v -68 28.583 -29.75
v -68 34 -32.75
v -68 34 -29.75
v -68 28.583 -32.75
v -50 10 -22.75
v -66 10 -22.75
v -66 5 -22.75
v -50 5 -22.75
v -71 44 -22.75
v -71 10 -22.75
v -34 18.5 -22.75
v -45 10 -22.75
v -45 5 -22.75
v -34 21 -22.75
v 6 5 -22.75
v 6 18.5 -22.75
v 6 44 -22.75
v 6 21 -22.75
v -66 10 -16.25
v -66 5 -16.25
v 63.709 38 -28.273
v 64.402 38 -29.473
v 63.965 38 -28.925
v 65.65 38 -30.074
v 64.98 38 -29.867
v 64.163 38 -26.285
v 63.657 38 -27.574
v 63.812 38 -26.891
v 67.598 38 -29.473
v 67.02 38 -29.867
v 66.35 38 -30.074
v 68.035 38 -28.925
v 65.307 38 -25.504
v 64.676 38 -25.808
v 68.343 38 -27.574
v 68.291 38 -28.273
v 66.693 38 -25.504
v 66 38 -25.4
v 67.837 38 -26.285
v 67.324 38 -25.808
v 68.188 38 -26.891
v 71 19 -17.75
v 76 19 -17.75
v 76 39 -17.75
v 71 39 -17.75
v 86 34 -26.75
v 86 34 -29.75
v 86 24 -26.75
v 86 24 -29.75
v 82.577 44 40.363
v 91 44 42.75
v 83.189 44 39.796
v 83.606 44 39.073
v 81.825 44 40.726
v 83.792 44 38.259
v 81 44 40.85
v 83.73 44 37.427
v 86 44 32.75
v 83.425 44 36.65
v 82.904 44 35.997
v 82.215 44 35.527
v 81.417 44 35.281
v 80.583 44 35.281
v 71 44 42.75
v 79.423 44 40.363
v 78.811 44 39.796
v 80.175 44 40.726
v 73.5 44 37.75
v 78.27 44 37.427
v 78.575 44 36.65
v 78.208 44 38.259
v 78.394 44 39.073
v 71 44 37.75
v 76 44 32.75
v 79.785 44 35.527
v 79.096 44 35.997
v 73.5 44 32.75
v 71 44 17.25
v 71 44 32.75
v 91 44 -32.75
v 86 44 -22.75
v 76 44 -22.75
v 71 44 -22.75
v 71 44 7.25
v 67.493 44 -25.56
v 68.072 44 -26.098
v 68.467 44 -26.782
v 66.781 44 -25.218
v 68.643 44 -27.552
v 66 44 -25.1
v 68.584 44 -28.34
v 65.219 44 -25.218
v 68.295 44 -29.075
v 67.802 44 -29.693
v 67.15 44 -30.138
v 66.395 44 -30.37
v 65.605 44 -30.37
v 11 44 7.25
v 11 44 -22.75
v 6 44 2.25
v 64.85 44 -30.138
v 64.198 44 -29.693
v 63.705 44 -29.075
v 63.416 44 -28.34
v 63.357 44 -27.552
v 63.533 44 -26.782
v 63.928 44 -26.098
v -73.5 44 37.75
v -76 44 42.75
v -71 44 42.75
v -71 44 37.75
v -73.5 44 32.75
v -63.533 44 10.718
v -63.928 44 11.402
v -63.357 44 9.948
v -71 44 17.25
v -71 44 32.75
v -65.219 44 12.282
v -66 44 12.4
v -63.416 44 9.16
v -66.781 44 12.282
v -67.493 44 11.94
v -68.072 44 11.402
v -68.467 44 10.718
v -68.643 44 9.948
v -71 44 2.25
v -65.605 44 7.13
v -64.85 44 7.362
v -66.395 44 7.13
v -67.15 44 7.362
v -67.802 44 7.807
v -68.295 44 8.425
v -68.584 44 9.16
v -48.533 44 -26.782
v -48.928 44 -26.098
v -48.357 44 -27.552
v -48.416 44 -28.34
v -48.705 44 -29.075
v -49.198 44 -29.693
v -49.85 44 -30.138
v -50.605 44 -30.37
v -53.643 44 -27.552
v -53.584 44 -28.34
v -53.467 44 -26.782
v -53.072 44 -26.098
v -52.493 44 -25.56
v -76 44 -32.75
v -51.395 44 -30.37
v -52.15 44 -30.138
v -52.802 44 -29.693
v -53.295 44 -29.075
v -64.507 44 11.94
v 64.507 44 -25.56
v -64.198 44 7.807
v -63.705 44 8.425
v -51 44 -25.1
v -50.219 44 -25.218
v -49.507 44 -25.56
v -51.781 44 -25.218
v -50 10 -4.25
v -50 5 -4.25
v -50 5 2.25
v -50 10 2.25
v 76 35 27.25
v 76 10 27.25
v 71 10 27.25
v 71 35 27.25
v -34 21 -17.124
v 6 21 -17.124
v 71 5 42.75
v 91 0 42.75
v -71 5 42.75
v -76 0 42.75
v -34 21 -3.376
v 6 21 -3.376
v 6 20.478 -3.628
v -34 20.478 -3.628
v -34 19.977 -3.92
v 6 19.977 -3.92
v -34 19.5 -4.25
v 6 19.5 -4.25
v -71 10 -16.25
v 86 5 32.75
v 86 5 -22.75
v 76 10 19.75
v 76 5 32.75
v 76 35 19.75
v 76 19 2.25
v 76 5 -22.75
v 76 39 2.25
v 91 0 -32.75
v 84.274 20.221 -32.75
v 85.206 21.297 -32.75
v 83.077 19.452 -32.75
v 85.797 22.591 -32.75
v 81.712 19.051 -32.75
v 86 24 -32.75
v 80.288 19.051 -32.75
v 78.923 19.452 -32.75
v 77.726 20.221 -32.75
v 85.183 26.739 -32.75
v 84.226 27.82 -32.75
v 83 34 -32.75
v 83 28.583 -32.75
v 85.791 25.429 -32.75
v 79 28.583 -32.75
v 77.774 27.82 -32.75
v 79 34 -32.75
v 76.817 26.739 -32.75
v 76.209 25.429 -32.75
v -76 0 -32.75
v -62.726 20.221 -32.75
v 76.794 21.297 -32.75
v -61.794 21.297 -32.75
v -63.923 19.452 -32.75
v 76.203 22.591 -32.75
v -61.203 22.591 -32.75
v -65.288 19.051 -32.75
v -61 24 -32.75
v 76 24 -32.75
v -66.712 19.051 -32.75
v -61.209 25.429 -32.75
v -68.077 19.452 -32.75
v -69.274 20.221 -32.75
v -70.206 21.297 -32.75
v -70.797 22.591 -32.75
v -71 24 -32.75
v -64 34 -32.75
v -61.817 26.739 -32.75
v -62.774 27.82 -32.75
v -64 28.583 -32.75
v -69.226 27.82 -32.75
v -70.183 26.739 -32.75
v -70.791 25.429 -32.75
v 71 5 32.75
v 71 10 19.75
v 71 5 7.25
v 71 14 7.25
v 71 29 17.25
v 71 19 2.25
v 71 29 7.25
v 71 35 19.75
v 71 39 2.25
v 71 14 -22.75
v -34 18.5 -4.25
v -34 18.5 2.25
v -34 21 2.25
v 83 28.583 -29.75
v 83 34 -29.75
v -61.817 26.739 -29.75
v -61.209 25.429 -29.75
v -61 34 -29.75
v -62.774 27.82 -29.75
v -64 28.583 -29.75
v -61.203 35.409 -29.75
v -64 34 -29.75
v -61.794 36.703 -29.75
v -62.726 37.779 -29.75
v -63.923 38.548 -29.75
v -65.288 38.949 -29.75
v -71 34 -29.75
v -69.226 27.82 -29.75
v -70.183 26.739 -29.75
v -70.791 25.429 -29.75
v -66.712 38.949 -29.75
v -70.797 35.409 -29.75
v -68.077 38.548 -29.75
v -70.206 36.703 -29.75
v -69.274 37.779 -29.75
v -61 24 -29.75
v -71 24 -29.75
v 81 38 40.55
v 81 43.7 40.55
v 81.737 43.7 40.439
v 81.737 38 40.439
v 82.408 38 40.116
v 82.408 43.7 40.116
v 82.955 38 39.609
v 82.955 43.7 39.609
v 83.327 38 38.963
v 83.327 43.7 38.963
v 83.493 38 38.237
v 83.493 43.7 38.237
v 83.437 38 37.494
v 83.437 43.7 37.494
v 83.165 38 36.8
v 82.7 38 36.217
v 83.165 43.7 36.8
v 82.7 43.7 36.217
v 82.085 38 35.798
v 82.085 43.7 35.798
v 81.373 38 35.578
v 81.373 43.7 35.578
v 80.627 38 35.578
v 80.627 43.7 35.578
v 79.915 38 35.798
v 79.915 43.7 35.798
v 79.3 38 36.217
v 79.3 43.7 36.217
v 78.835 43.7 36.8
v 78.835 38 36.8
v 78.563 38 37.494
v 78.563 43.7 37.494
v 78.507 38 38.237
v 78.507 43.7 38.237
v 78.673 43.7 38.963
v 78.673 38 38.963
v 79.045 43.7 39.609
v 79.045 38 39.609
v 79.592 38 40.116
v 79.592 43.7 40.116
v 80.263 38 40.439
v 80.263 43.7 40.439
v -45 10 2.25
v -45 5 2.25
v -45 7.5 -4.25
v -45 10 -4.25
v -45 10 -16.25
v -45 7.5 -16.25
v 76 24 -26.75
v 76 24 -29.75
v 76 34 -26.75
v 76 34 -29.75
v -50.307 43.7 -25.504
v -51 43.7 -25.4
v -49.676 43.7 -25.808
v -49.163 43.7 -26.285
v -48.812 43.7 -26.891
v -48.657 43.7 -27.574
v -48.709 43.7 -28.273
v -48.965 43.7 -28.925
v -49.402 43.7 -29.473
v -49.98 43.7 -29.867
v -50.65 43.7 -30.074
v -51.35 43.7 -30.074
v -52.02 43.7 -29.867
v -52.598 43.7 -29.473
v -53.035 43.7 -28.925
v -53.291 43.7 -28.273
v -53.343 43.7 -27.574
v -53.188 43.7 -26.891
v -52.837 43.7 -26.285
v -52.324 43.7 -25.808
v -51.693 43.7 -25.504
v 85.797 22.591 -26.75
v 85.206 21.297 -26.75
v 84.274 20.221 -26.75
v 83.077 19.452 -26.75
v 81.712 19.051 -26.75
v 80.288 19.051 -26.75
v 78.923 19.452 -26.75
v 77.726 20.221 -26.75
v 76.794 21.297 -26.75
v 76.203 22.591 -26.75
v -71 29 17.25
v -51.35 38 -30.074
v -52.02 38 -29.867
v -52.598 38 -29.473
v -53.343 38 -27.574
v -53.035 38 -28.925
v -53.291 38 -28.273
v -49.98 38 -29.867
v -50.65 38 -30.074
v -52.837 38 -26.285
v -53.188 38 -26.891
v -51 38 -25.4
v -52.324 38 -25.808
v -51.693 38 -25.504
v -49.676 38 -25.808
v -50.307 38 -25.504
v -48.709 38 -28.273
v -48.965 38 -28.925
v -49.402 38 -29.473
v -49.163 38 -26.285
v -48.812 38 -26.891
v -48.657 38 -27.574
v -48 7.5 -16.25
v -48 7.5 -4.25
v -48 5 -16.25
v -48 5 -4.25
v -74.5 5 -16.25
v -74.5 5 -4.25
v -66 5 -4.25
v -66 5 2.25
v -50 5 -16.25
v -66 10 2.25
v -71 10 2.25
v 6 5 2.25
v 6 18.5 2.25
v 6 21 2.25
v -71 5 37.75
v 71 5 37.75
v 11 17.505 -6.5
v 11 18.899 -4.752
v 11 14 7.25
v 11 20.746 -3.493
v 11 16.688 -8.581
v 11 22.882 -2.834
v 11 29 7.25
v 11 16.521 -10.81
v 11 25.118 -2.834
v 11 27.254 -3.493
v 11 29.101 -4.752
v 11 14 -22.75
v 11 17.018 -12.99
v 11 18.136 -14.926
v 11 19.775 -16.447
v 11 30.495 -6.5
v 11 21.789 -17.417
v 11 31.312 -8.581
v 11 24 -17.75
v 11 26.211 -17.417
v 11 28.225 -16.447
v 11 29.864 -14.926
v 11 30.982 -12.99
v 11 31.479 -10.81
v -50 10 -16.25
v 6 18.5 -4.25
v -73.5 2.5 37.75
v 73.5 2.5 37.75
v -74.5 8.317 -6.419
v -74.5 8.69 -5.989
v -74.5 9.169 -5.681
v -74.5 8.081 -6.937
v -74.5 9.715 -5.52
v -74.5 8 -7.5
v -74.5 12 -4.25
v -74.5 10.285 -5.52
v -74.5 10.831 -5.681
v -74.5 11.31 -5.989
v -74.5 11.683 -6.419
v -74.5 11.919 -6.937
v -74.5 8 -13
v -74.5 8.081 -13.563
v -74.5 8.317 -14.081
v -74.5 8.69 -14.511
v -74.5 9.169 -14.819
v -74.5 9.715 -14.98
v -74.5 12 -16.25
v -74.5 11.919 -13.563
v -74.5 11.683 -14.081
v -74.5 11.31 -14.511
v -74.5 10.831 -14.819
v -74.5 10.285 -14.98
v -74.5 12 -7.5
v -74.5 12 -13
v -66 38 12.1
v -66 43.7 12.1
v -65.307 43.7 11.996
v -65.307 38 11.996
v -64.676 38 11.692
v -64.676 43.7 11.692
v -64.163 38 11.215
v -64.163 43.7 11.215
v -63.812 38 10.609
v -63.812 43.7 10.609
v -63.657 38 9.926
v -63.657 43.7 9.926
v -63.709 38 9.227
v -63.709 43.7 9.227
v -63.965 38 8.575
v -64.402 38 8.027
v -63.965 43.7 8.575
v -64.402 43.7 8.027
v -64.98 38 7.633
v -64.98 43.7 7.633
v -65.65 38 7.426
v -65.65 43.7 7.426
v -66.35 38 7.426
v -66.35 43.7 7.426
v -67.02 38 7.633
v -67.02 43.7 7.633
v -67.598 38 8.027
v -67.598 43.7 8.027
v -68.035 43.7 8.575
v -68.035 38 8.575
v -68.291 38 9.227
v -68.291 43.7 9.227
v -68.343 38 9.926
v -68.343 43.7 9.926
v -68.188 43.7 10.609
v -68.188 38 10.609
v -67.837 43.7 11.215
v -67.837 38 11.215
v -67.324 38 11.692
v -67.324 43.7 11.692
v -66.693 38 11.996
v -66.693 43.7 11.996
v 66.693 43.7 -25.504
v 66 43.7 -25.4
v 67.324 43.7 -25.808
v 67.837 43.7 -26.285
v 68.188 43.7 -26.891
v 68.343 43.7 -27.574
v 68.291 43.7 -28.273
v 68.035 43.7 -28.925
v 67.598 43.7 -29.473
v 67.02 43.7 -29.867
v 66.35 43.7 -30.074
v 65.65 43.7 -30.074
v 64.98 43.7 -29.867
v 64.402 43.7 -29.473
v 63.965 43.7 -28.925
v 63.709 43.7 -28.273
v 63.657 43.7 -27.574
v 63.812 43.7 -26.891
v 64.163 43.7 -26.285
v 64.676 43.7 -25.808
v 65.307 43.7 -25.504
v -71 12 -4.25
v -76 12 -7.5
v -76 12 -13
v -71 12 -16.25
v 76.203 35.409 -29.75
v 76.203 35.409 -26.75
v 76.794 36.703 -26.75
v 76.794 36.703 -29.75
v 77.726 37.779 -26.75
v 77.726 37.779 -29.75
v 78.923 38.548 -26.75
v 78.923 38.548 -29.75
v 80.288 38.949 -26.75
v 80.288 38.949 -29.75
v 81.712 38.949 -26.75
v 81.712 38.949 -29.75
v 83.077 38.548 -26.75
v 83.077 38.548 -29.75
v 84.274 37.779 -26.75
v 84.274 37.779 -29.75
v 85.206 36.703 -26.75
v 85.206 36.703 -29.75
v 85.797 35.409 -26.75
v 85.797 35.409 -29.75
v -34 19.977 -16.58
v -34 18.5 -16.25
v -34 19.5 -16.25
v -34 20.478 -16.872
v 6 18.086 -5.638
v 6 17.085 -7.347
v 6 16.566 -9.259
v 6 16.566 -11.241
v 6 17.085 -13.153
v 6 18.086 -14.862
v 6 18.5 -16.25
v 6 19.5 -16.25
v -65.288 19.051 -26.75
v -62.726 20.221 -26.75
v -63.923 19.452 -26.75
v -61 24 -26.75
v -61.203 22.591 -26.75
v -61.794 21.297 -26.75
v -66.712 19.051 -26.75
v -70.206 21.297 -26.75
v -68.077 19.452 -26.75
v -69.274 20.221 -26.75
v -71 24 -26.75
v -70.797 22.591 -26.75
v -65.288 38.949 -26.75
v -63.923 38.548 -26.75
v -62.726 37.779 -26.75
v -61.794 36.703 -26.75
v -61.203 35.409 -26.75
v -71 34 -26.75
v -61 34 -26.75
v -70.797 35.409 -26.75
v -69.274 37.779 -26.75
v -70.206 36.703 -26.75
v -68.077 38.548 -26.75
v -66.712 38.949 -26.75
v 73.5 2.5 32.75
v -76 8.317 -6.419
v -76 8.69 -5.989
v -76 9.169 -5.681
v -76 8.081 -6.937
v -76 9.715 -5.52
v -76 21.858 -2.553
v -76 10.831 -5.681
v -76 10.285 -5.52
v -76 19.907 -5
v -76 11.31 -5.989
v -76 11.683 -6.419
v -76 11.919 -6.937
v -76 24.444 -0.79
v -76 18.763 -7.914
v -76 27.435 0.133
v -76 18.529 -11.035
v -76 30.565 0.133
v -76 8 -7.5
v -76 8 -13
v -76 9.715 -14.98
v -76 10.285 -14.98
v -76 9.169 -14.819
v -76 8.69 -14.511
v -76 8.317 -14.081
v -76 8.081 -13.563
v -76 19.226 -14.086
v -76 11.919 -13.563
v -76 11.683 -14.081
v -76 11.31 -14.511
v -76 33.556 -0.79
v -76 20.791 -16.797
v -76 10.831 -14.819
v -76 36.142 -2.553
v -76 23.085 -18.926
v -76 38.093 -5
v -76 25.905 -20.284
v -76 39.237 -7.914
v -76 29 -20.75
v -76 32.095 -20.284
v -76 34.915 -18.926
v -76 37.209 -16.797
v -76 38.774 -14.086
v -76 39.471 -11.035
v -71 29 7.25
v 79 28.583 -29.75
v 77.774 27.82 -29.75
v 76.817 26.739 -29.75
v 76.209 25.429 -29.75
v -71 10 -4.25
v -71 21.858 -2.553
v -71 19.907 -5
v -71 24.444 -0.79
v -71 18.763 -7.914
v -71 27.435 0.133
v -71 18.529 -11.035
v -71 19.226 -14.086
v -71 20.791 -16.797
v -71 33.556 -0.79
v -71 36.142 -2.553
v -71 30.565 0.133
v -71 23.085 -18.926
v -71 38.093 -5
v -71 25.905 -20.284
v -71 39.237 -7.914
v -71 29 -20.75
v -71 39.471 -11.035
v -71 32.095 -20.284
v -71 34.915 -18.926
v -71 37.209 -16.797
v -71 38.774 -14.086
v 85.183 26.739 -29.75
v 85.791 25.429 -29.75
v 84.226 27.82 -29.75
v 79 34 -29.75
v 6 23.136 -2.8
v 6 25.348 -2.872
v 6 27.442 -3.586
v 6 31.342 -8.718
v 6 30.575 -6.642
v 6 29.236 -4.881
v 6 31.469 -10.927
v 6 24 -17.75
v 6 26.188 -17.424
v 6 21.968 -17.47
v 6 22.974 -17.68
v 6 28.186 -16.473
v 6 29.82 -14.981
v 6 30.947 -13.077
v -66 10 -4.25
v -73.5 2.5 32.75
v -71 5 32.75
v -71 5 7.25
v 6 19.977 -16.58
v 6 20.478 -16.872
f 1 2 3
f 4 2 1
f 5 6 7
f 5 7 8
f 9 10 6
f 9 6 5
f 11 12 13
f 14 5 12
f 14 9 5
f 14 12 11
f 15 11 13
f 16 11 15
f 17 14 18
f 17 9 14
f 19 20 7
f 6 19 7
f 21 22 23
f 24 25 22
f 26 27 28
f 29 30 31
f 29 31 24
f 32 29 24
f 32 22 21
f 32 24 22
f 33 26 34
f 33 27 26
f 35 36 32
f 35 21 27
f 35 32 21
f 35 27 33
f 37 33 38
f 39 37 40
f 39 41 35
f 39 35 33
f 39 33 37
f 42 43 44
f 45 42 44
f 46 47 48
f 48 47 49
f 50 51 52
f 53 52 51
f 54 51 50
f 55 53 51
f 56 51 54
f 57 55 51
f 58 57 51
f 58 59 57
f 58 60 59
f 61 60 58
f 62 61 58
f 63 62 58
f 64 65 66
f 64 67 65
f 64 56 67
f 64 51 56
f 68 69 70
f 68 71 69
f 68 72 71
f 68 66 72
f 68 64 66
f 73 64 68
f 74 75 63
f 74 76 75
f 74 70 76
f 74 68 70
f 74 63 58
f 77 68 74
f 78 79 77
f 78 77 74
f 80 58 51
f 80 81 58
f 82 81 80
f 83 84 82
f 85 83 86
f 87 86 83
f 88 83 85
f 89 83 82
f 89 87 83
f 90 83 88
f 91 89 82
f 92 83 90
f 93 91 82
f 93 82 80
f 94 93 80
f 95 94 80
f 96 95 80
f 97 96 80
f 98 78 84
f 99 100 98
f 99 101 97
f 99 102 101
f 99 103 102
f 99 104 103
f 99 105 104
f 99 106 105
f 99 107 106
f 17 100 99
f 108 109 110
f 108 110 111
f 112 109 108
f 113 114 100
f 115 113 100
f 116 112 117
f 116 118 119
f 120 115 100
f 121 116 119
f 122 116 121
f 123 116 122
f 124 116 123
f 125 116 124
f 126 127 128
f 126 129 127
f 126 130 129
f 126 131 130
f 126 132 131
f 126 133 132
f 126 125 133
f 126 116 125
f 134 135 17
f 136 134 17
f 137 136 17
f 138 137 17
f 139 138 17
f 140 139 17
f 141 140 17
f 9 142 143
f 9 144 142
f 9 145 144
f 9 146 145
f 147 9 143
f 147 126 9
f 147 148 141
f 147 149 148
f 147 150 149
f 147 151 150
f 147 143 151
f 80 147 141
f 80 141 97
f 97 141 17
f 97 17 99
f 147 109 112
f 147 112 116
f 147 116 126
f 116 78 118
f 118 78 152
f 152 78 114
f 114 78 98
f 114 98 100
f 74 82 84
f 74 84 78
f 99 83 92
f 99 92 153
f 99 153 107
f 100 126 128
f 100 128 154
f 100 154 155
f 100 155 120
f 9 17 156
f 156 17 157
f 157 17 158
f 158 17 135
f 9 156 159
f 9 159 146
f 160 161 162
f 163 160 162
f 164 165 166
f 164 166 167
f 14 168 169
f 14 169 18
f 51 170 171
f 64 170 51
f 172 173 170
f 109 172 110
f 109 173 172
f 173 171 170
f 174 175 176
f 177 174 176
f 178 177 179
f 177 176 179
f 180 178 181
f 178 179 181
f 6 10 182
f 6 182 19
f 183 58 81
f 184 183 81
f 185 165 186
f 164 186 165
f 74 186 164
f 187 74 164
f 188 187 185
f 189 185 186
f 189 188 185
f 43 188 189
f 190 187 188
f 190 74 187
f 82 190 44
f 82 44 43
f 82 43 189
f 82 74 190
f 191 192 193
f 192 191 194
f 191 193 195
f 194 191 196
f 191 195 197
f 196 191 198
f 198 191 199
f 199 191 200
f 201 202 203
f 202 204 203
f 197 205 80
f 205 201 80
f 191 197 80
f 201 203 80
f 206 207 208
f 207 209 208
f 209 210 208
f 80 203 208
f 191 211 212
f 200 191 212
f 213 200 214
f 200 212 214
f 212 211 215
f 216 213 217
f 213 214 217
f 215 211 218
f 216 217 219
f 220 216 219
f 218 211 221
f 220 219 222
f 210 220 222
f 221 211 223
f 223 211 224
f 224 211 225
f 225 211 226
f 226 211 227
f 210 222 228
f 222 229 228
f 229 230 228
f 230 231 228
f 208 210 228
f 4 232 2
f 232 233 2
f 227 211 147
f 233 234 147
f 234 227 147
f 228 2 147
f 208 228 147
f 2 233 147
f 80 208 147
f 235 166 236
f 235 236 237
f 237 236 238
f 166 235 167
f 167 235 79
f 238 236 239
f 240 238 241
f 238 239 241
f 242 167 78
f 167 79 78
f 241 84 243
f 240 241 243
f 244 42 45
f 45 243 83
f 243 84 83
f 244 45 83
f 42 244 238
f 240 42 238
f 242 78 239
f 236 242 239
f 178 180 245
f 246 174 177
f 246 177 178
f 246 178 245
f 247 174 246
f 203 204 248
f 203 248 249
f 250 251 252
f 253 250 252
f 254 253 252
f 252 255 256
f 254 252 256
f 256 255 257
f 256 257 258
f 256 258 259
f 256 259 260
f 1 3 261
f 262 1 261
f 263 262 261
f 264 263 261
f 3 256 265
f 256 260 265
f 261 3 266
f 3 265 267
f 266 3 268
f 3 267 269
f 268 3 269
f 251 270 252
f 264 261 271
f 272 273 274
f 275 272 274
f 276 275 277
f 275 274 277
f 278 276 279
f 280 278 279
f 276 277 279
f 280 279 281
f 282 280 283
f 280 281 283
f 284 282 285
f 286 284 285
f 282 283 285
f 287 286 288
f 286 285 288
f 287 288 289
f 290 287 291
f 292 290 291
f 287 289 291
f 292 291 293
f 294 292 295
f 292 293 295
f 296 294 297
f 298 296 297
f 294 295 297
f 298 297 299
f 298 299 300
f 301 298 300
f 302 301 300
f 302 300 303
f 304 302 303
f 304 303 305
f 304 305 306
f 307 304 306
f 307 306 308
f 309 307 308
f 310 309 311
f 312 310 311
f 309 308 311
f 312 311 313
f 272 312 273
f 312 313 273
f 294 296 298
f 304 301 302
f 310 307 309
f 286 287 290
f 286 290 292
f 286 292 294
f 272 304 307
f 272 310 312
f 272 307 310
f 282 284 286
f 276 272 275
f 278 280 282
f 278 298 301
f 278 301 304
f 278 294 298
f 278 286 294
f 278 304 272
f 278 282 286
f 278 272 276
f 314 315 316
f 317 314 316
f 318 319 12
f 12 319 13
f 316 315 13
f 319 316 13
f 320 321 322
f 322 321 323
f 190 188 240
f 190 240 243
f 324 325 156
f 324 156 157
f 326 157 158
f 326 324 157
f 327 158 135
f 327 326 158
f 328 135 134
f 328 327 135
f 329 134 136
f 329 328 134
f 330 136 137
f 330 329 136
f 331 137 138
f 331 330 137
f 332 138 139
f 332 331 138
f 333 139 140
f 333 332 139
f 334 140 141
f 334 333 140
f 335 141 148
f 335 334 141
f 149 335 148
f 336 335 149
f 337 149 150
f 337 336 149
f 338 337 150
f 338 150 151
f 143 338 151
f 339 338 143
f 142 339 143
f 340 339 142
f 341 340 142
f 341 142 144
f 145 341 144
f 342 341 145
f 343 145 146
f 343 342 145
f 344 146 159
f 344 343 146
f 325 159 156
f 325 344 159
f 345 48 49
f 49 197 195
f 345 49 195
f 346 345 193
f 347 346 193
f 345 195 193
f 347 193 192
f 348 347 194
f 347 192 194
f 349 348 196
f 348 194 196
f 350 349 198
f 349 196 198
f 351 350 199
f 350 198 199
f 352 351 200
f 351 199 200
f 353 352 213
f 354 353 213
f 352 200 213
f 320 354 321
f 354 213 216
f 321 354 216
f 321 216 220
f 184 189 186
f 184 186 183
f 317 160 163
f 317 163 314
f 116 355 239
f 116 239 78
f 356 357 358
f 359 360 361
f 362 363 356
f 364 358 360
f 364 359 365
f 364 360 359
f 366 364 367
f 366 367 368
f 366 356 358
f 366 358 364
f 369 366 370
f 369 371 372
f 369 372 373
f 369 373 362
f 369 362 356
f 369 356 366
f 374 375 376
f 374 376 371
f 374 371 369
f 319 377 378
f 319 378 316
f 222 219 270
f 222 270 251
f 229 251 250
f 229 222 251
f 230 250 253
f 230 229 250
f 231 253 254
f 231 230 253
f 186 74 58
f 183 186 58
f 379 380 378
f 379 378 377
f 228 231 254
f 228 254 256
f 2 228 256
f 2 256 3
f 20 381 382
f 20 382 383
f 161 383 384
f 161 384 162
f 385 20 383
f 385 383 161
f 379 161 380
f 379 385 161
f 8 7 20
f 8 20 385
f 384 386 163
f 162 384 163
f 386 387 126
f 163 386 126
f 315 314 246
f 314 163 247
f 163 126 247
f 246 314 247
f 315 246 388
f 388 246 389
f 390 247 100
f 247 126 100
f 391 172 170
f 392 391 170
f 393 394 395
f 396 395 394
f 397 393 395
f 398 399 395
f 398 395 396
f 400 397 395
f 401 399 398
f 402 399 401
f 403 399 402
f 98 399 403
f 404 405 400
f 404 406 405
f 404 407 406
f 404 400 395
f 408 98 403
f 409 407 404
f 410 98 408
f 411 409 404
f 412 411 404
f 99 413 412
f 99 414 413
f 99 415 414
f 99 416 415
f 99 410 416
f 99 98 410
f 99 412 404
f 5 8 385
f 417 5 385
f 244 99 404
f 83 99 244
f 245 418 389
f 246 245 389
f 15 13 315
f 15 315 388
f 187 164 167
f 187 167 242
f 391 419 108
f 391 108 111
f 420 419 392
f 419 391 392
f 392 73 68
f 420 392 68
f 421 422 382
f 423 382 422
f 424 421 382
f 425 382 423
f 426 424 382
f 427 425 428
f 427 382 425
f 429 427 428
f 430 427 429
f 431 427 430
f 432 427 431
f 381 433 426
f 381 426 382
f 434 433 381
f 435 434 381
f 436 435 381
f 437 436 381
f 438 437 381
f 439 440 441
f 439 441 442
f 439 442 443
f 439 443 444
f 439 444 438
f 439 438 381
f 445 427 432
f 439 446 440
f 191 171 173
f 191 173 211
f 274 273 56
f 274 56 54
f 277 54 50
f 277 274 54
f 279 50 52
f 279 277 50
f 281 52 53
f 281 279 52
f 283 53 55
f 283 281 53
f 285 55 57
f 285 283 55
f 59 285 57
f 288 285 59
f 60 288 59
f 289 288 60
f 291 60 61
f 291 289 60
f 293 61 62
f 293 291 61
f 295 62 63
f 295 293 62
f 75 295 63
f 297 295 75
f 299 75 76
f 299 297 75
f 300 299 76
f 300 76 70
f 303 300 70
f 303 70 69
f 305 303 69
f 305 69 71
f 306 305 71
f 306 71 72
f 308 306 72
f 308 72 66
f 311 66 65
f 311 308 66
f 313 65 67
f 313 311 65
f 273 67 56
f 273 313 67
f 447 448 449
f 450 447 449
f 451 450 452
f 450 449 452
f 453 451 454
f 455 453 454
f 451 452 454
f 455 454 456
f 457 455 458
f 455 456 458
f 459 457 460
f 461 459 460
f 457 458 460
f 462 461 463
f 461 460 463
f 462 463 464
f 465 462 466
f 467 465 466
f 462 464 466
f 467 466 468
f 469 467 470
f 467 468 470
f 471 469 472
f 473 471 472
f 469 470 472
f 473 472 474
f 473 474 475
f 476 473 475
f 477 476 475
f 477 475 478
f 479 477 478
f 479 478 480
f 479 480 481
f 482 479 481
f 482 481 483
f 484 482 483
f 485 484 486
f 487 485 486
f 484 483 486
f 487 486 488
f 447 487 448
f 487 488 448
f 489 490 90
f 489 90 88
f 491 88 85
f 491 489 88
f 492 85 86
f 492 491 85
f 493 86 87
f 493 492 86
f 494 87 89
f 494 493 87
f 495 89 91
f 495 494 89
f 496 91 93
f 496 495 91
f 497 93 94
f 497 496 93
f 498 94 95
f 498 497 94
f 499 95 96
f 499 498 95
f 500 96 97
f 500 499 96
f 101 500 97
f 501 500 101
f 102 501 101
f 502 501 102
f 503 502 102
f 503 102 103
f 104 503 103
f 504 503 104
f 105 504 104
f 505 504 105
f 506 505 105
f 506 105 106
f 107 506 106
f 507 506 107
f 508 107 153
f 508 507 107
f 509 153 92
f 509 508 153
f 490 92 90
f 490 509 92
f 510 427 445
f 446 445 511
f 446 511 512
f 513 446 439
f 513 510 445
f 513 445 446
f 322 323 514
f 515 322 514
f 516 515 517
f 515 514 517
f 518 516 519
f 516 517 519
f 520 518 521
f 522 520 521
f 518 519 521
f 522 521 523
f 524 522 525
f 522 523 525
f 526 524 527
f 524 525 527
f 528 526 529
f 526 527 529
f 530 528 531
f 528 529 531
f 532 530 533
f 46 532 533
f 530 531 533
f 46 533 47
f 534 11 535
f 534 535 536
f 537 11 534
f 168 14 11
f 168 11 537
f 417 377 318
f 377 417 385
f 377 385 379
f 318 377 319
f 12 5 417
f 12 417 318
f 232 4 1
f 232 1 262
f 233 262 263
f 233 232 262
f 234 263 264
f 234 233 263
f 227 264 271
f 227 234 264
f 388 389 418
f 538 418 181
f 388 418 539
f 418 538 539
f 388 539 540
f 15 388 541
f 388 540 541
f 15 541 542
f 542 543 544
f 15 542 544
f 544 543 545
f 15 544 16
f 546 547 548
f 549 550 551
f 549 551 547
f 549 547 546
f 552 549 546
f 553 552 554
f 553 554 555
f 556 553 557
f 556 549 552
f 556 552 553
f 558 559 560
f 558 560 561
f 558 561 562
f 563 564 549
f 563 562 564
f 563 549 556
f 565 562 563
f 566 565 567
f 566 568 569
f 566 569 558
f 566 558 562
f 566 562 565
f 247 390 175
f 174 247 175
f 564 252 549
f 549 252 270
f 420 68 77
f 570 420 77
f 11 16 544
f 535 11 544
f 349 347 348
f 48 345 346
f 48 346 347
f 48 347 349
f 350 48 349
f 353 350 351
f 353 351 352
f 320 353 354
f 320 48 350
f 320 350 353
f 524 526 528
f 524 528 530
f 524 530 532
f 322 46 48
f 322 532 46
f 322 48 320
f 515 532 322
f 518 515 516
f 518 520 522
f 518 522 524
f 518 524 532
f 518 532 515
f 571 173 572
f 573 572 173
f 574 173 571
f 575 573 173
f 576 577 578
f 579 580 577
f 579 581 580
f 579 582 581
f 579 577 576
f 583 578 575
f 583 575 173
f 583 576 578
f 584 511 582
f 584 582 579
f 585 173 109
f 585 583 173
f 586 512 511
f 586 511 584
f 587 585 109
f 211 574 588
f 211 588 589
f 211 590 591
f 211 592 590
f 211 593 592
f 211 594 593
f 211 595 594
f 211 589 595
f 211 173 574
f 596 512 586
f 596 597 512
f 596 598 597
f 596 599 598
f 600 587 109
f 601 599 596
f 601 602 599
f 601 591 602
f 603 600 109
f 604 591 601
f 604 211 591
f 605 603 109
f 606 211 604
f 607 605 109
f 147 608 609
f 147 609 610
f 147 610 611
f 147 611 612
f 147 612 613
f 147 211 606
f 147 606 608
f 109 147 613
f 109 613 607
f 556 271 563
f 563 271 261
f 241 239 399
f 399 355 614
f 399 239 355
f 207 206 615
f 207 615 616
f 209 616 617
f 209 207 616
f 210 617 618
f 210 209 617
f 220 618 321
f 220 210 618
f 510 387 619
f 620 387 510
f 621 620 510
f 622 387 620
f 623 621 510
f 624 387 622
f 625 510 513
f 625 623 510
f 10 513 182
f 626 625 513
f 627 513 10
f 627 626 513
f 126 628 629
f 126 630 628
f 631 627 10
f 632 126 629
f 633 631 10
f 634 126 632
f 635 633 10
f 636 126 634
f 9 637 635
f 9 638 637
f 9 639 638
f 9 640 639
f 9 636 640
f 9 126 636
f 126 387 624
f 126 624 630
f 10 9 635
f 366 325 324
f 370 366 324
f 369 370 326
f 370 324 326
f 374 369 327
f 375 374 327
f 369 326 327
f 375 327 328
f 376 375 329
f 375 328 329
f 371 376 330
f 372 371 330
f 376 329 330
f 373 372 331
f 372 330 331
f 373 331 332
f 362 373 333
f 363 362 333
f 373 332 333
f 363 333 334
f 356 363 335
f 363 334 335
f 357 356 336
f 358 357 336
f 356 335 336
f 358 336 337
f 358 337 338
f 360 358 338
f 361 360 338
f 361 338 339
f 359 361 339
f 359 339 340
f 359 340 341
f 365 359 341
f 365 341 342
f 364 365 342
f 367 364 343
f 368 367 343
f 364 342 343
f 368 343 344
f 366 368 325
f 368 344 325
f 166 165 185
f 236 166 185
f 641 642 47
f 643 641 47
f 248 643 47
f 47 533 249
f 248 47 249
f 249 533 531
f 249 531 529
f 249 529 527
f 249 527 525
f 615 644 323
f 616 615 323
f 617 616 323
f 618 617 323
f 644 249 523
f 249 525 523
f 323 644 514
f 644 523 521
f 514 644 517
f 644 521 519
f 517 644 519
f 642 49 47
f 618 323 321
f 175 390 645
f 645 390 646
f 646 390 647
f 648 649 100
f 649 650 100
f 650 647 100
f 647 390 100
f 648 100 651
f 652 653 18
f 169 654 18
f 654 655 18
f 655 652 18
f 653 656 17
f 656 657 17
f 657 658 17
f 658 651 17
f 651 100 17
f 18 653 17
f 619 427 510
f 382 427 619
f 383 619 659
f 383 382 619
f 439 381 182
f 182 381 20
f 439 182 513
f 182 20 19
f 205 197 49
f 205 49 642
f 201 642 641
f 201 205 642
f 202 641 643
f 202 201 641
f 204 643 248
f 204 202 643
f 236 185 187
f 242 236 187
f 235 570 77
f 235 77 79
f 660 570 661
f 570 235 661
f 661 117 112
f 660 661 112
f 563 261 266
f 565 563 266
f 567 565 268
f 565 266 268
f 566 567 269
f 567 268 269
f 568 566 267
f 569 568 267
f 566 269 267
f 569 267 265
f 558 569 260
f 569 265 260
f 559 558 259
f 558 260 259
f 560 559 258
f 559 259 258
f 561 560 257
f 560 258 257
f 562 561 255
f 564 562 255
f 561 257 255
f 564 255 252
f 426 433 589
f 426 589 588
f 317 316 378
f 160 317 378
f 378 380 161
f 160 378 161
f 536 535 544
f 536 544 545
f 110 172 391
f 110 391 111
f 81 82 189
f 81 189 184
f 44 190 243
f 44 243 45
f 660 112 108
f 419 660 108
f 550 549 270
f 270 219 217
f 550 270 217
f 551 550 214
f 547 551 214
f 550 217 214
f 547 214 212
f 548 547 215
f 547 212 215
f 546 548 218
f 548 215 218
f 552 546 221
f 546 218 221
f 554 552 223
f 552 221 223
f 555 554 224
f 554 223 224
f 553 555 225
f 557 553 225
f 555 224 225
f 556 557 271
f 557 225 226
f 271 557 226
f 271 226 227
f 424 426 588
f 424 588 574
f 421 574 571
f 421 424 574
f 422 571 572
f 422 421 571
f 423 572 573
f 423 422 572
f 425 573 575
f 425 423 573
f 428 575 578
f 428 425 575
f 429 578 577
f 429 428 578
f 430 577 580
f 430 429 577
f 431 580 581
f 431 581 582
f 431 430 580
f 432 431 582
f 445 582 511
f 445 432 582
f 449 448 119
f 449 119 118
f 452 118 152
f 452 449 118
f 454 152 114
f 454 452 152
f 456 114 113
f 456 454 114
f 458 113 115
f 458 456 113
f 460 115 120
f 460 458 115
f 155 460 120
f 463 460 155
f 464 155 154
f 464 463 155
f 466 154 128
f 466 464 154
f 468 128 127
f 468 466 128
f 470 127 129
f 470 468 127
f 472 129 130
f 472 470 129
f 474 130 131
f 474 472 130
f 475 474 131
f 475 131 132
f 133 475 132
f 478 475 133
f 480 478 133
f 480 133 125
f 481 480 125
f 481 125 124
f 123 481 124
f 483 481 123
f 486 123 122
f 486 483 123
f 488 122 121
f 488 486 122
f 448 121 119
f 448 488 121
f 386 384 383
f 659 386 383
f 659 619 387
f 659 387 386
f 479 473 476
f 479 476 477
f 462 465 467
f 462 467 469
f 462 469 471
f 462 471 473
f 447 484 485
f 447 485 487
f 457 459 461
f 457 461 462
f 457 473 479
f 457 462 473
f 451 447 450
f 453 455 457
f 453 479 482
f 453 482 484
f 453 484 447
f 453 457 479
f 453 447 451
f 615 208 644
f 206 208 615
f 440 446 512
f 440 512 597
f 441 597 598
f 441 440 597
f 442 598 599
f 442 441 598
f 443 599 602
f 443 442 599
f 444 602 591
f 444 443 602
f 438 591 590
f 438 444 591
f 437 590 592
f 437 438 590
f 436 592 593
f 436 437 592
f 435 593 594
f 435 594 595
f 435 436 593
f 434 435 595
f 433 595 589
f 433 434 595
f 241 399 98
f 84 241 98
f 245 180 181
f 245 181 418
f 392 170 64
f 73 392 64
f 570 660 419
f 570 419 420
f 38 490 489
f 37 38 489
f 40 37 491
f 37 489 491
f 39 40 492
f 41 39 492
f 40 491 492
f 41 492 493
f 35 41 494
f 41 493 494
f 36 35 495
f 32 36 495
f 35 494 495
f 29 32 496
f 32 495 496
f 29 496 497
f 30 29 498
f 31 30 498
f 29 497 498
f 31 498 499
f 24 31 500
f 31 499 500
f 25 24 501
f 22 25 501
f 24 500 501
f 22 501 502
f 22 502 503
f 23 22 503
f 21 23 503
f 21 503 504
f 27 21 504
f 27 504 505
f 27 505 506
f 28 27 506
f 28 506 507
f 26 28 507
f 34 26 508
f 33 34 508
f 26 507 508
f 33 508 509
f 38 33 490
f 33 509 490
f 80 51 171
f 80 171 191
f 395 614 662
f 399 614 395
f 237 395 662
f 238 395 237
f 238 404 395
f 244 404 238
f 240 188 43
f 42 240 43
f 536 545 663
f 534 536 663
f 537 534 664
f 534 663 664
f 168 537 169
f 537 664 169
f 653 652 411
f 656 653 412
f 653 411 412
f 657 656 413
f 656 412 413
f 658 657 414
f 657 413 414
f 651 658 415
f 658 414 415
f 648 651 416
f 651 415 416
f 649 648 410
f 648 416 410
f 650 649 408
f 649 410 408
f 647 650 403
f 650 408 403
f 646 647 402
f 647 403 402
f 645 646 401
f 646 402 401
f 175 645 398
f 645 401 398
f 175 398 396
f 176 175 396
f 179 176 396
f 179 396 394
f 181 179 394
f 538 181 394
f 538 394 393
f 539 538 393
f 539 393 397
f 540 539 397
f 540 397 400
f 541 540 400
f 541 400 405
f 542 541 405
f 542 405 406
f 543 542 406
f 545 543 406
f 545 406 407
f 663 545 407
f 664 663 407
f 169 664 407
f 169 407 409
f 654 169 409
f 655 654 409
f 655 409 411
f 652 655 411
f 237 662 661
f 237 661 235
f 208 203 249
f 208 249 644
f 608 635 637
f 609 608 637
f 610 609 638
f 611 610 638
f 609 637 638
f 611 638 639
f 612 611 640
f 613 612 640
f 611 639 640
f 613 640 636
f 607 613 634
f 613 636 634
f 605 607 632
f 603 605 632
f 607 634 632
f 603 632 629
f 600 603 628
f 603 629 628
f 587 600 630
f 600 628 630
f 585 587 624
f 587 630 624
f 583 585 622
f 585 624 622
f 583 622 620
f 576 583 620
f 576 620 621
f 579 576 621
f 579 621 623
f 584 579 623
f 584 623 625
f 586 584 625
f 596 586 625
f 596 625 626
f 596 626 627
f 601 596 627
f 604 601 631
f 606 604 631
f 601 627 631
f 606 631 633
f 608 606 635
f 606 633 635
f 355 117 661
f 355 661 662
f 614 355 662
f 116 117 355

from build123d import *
from build123d.topology import SkipClean

# Parameters (mm, degrees)
SKETCH1_W           = 152
SKETCH1_H           = 65.5
BOSS_EXTRUDE1_DEPTH = 44
SKETCH2_W           = 142
SKETCH2_H           = 25.5
CUT_EXTRUDE1_DEPTH  = 39
SKETCH4_W           = 60
SKETCH4_H           = 30
CUT_EXTRUDE2_DEPTH  = 30
BOSS_EXTRUDE3_REACH = 158.9
SKETCH5_W           = 10
SKETCH5_H           = 15
SKETCH9_W           = 152
SKETCH9_H           = 44
BOSS_EXTRUDE4_DEPTH = 10
CUT_EXTRUDE5_DEPTH  = 41.5
SKETCH11_W          = 142
SKETCH11_H          = 39
CUT_EXTRUDE6_DEPTH  = 5
SKETCH16_W          = 77
SKETCH16_H          = 25
CUT_EXTRUDE8_DEPTH  = 39
SKETCH17_R          = 10.5
CUT_EXTRUDE9_DEPTH  = 5
SKETCH18_R          = 7.5
CUT_EXTRUDE10_DEPTH = 5
SKETCH20_W          = 75.5
SKETCH20_H          = 44
BOSS_EXTRUDE6_DEPTH = 15
SKETCH21_W          = 10
SKETCH21_H          = 55.5
CUT_EXTRUDE12_DEPTH = 39
SKETCH22_W          = 20
SKETCH22_H          = 20
SKETCH22_W_2        = 7.5
SKETCH22_H_2        = 25
CUT_EXTRUDE13_DEPTH = 5
CUT_EXTRUDE14_DEPTH = 3.5
SKETCH24_W          = 5
SKETCH24_H          = 6.5
BOSS_EXTRUDE7_DEPTH = 5
SKETCH24_3_W        = 3
SKETCH24_3_H        = 12
BOSS_EXTRUDE8_DEPTH = 2.5
CUT_EXTRUDE7_DEPTH  = 6
BOSS_EXTRUDE5_DEPTH = 3
SKETCH19_R          = 2.35
SKETCH19_R_2        = 2.5
CUT_EXTRUDE11_DEPTH = 6
BOSS_EXTRUDE9_DEPTH = 40
CHAMFER1_SIZE       = 0.3


with BuildPart() as part:
    # Sketch1 → Boss-Extrude1 (new body)
    with BuildSketch(Plane(origin=(0, 0, 0), x_dir=(1, 0, 0), z_dir=(0, 1, 0))):
        Rectangle(SKETCH1_W, SKETCH1_H)
    extrude(amount=BOSS_EXTRUDE1_DEPTH)

    # Sketch2 → Cut-Extrude1 (cut)
    with BuildSketch(Plane(origin=(0, 44, 0), x_dir=(1, 0, 0), z_dir=(0, 1, 0))):
        with Locations((0, -20)):
            Rectangle(SKETCH2_W, SKETCH2_H)
    extrude(amount=-CUT_EXTRUDE1_DEPTH, mode=Mode.SUBTRACT)

    # Sketch4 → Cut-Extrude2 (cut)
    with BuildSketch(Plane(origin=(0, 44, 0), x_dir=(1, 0, 0), z_dir=(0, 1, 0))):
        with Locations((41, 7.75)):
            Rectangle(SKETCH4_W, SKETCH4_H)
    extrude(amount=-CUT_EXTRUDE2_DEPTH, mode=Mode.SUBTRACT)

    # Boss-Extrude3: up to this face of the body (flat: up to its plane)
    boss_extrude3_end = Plane(part.part.faces().sort_by_distance((71, 26.637767221, 6.817102138))[0])
    # Sketch5 → Boss-Extrude3 (add, up to the picked face)
    with BuildSketch(Plane(origin=(-71, 0, 0), x_dir=(0, 0, -1), z_dir=(1, 0, 0)), mode=Mode.PRIVATE) as boss_extrude3_sk1:
        with Locations((-12.25, 36.5)):
            Rectangle(SKETCH5_W, SKETCH5_H)
    boss_extrude3_tool1 = split(extrude(boss_extrude3_sk1.sketch, amount=BOSS_EXTRUDE3_REACH, mode=Mode.PRIVATE), bisect_by=boss_extrude3_end, keep=Keep.BOTH, mode=Mode.PRIVATE)
    add(boss_extrude3_tool1.solids().sort_by(Axis((-71, 36.5, 12.25), (1, 0, 0)))[0])

    # Sketch9 → Boss-Extrude4 (add)
    with BuildSketch(Plane.XY.offset(32.75)):
        with Locations((0, 22)):
            Rectangle(SKETCH9_W, SKETCH9_H)
    extrude(amount=BOSS_EXTRUDE4_DEPTH)

    # Sketch10 → Cut-Extrude5 (cut)
    with BuildSketch(Plane(origin=(0, 44, 0), x_dir=(1, 0, 0), z_dir=(0, 1, 0))):
        Polygon((-73.5, -32.75), (-73.5, -37.75), (73.5, -37.75), (73.5, -32.75), (71, -32.75), (-71, -32.75), align=None)
    extrude(amount=-CUT_EXTRUDE5_DEPTH, mode=Mode.SUBTRACT)

    # Sketch11 → Cut-Extrude6 (cut)
    with BuildSketch(Plane.XY.offset(42.75)):
        with Locations((0, 24.5)):
            Rectangle(SKETCH11_W, SKETCH11_H)
    extrude(amount=-CUT_EXTRUDE6_DEPTH, mode=Mode.SUBTRACT)

    # Sketch16 → Cut-Extrude8 (cut)
    with BuildSketch(Plane(origin=(0, 44, 0), x_dir=(1, 0, 0), z_dir=(0, 1, 0))):
        with Locations((-32.5, 10.25)):
            Rectangle(SKETCH16_W, SKETCH16_H)
    extrude(amount=-CUT_EXTRUDE8_DEPTH, mode=Mode.SUBTRACT)

    # Sketch17 → Cut-Extrude9 (cut)
    with BuildSketch(Plane(origin=(-71, 0, 0), x_dir=(0, 0, -1), z_dir=(1, 0, 0))):
        with Locations((10.25, 29)):
            Circle(SKETCH17_R)
        with BuildLine():
            Line((7.5, 12), (13, 12))
            ThreePointArc((13, 12), (15, 10), (13, 8))
            Line((13, 8), (7.5, 8))
            ThreePointArc((7.5, 8), (5.5, 10), (7.5, 12))
        make_face()
    extrude(amount=-CUT_EXTRUDE9_DEPTH, mode=Mode.SUBTRACT)

    # Sketch18 → Cut-Extrude10 (cut)
    with BuildSketch(Plane(origin=(11, 0, 0), x_dir=(0, 0, -1), z_dir=(1, 0, 0))):
        with Locations((10.25, 24)):
            Circle(SKETCH18_R)
    extrude(amount=-CUT_EXTRUDE10_DEPTH, mode=Mode.SUBTRACT)

    # Sketch20 → Boss-Extrude6 (add)
    with BuildSketch(Plane(origin=(76, 0, 0), x_dir=(0, 0, -1), z_dir=(1, 0, 0))):
        with Locations((-5, 22)):
            Rectangle(SKETCH20_W, SKETCH20_H)
    extrude(amount=BOSS_EXTRUDE6_DEPTH)

    # Sketch21 → Cut-Extrude12 (cut)
    with BuildSketch(Plane(origin=(0, 44, 0), x_dir=(1, 0, 0), z_dir=(0, 1, 0))):
        with Locations((81, -5)):
            Rectangle(SKETCH21_W, SKETCH21_H)
    extrude(amount=-CUT_EXTRUDE12_DEPTH, mode=Mode.SUBTRACT)

    # Sketch22 → Cut-Extrude13 (cut)
    with BuildSketch(Plane(origin=(76, 0, 0), x_dir=(0, 0, -1), z_dir=(1, 0, 0))):
        with Locations((7.75, 29)):
            Rectangle(SKETCH22_W, SKETCH22_H)
        with Locations((-23.5, 22.5)):
            Rectangle(SKETCH22_W_2, SKETCH22_H_2)
    extrude(amount=-CUT_EXTRUDE13_DEPTH, mode=Mode.SUBTRACT)

    # Sketch23 → Cut-Extrude14 (cut)
    with BuildSketch(Plane(origin=(-71, 0, 0), x_dir=(0, 0, -1), z_dir=(1, 0, 0))):
        with BuildLine():
            ThreePointArc((7.5, 8), (5.5, 10), (7.5, 12))
            Line((7.5, 12), (4.25, 12))
            Line((4.25, 12), (4.25, 5))
            Line((4.25, 5), (16.25, 5))
            Line((16.25, 5), (16.25, 12))
            Line((16.25, 12), (13, 12))
            ThreePointArc((13, 12), (15, 10), (13, 8))
            Line((13, 8), (7.5, 8))
        make_face()
    extrude(amount=-CUT_EXTRUDE14_DEPTH, mode=Mode.SUBTRACT)

    # Sketch24 → Boss-Extrude7 (add)
    with BuildSketch(Plane(origin=(0, 5, 0), x_dir=(1, 0, 0), z_dir=(0, 1, 0))):
        with Locations((-68.5, 1)):
            Rectangle(SKETCH24_W, SKETCH24_H)
        with Locations((-68.5, 19.5)):
            Rectangle(SKETCH24_W, SKETCH24_H)
        Polygon((-45, -2.25), (-45, 4.25), (-48, 4.25), (-50, 4.25), (-50, -2.25), align=None)
        Polygon((-45, 22.75), (-50, 22.75), (-50, 16.25), (-48, 16.25), (-45, 16.25), align=None)
    extrude(amount=BOSS_EXTRUDE7_DEPTH)

    # Sketch24<3> → Boss-Extrude8 (add)
    with BuildSketch(Plane(origin=(0, 5, 0), x_dir=(1, 0, 0), z_dir=(0, 1, 0))):
        with Locations((-46.5, 10.25)):
            Rectangle(SKETCH24_3_W, SKETCH24_3_H)
    extrude(amount=BOSS_EXTRUDE8_DEPTH)

    # Sketch13 → Cut-Extrude7 (cut)
    with BuildSketch(Plane(origin=(0, 0, -32.75), x_dir=(-1, 0, 0), z_dir=(0, 0, -1))):
        with BuildLine():
            Line((-86, 34), (-86, 24))
            ThreePointArc((-86, 24), (-81, 19), (-76, 24))
            Line((-76, 24), (-76, 34))
            ThreePointArc((-76, 34), (-81, 39), (-86, 34))
        make_face()
        with BuildLine():
            Line((61, 34), (61, 24))
            ThreePointArc((61, 24), (66, 19), (71, 24))
            Line((71, 24), (71, 34))
            ThreePointArc((71, 34), (66, 39), (61, 34))
        make_face()
    extrude(amount=-CUT_EXTRUDE7_DEPTH, mode=Mode.SUBTRACT)

    # Sketch15 → Boss-Extrude5 (add)
    with SkipClean():  # the faces are left unmerged after this step: merging them gives an invalid solid
        with BuildSketch(Plane(origin=(0, 0, -32.75), x_dir=(-1, 0, 0), z_dir=(0, 0, -1))):
            with BuildLine():
                ThreePointArc((-76, 34), (-81, 39), (-86, 34))
                Line((-86, 34), (-86, 24))
                ThreePointArc((-86, 24), (-85.183300133, 26.738612788), (-83, 28.582575695))
                Line((-83, 28.582575695), (-83, 34))
                Line((-83, 34), (-79, 34))
                Line((-79, 34), (-79, 28.582575695))
                ThreePointArc((-79, 28.582575695), (-76.816699867, 26.738612788), (-76, 24))
                Line((-76, 24), (-76, 34))
            make_face()
            with BuildLine():
                ThreePointArc((71, 34), (66, 39), (61, 34))
                Line((61, 34), (61, 24))
                ThreePointArc((61, 24), (61.816699867, 26.738612788), (64, 28.582575695))
                Line((64, 28.582575695), (64, 34))
                Line((64, 34), (68, 34))
                Line((68, 34), (68, 28.582575695))
                ThreePointArc((68, 28.582575695), (70.183300133, 26.738612788), (71, 24))
                Line((71, 24), (71, 34))
            make_face()
        extrude(amount=-BOSS_EXTRUDE5_DEPTH)

    # Sketch19 → Cut-Extrude11 (cut)
    with SkipClean():  # the faces are left unmerged after this step: merging them gives an invalid solid
        with BuildSketch(Plane(origin=(0, 44, 0), x_dir=(1, 0, 0), z_dir=(0, 1, 0))):
            with Locations(Location((-66, -9.75, 0), (0, 0, 270))):
                Circle(SKETCH19_R)
            with Locations(Location((-51, 27.75, 0), (0, 0, 270))):
                Circle(SKETCH19_R)
            with Locations(Location((66, 27.75, 0), (0, 0, 270))):
                Circle(SKETCH19_R)
            with Locations(Location((81, -38.05, 0), (0, 0, 270))):
                Circle(SKETCH19_R_2)
        extrude(amount=-CUT_EXTRUDE11_DEPTH, mode=Mode.SUBTRACT)

    # Sketch25 → Boss-Extrude9 (add)
    with SkipClean():  # the faces are left unmerged after this step: merging them gives an invalid solid
        with BuildSketch(Plane.ZY.offset(-6)):
            with BuildLine():
                Line((-22.75, 21), (-22.75, 18.5))
                Line((-22.75, 18.5), (-16.25, 18.5))
                Line((-16.25, 18.5), (-16.25, 19.5))
                ThreePointArc((-16.25, 19.5), (-16.730477654, 20.224631227), (-17.123863542, 21))
                Line((-17.123863542, 21), (-22.75, 21))
            make_face()
            with BuildLine():
                Line((-4.25, 18.5), (2.25, 18.5))
                Line((2.25, 18.5), (2.25, 21))
                Line((2.25, 21), (-3.376136458, 21))
                ThreePointArc((-3.376136458, 21), (-3.769522346, 20.224631227), (-4.25, 19.5))
                Line((-4.25, 19.5), (-4.25, 18.5))
            make_face()
        extrude(amount=BOSS_EXTRUDE9_DEPTH)

    # Chamfer1
    chamfer1_edges = [part.edges().sort_by_distance(p)[0] for p in [
        (-66, 44, 7.4),
        (-51, 44, -30.1),
        (66, 44, -30.1),
        (81, 44, 35.55),
    ]]
    chamfer(chamfer1_edges, length=CHAMFER1_SIZE)


solid = part.part
